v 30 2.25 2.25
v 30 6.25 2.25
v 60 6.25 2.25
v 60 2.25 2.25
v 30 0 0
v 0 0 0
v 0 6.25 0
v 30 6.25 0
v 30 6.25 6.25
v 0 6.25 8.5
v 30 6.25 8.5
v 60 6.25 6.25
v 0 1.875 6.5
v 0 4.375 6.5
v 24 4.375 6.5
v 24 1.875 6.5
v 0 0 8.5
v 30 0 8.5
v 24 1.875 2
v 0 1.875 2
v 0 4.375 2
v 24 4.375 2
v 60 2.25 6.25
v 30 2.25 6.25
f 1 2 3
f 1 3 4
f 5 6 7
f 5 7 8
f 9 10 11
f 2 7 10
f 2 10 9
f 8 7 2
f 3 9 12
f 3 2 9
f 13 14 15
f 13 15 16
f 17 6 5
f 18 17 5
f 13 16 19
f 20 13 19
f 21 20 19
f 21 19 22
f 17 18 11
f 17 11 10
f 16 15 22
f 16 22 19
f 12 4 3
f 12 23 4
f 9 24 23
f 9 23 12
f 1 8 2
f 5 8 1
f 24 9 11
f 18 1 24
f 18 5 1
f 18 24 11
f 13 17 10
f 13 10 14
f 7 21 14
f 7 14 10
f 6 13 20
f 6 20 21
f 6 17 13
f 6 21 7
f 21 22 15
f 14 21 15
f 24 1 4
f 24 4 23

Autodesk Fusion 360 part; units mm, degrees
sketch "Sketch1" plane through (0, 0, 0) normal (0, 1, 0) x (1, 0, 0)
  line L0 (0, 0) -> (30, 0)
  line L1 (30, 0) -> (30, -8.5)
  line L2 (30, -8.5) -> (0, -8.5)
  line L3 (0, -8.5) -> (0, 0)
  dimension "d1" = 30
  dimension "d2" = 8.5
extrude "Extrude1" add sketch "Sketch1" along normal blind 6.25
sketch "Sketch2" plane through (0, 0, 0) normal (-1, 0, 0) x (0, -1, 0)
  line L0 (0, 0) -> (0, 8.5)
  line L1 (0, 8.5) -> (-6.25, 8.5)
  line L2 (-6.25, 8.5) -> (-6.25, 0)
  line L3 (-6.25, 0) -> (0, 0)
  line L4 (-6.25, 8.5) -> (-4.375, 8.5)
  line L5 (-4.375, 8.5) -> (-4.375, 6.5)
  line L6 (-4.375, 6.5) -> (-1.875, 6.5)
  line L7 (-1.875, 6.5) -> (-1.875, 2)
  line L8 (-1.875, 2) -> (-4.375, 2)
  line L9 (-4.375, 2) -> (-4.375, 6.5)
  dimension "d5" = 1.875
  dimension "d6" = 2
  dimension "d7" = 2.5
  dimension "d8" = 4.5
extrude "Extrude2" cut sketch "Sketch2" against normal blind 24 contours L6 L7 L8 L9
sketch "Sketch3" plane through (30, 0, 0) normal (1, 0, 0) x (0, 1, 0)
  line L0 (0, 8.5) -> (0, 0)
  line L1 (0, 0) -> (6.25, 0)
  line L2 (6.25, 0) -> (6.25, 8.5)
  line L3 (6.25, 8.5) -> (0, 8.5)
  line L4 (0, 8.5) -> (2.25, 8.5)
  line L5 (2.25, 8.5) -> (2.25, 6.25)
  line L6 (2.25, 6.25) -> (6.25, 6.25)
  line L7 (6.25, 6.25) -> (6.25, 2.25)
  line L8 (6.25, 2.25) -> (2.25, 2.25)
  line L9 (2.25, 2.25) -> (2.25, 6.25)
  dimension "d11" = 2.25
  dimension "d12" = 2.25
  dimension "d13" = 4
  dimension "d14" = 4
extrude "Extrude3" add sketch "Sketch3" along normal blind 30 contours L2 L6 L7 L8 L9
